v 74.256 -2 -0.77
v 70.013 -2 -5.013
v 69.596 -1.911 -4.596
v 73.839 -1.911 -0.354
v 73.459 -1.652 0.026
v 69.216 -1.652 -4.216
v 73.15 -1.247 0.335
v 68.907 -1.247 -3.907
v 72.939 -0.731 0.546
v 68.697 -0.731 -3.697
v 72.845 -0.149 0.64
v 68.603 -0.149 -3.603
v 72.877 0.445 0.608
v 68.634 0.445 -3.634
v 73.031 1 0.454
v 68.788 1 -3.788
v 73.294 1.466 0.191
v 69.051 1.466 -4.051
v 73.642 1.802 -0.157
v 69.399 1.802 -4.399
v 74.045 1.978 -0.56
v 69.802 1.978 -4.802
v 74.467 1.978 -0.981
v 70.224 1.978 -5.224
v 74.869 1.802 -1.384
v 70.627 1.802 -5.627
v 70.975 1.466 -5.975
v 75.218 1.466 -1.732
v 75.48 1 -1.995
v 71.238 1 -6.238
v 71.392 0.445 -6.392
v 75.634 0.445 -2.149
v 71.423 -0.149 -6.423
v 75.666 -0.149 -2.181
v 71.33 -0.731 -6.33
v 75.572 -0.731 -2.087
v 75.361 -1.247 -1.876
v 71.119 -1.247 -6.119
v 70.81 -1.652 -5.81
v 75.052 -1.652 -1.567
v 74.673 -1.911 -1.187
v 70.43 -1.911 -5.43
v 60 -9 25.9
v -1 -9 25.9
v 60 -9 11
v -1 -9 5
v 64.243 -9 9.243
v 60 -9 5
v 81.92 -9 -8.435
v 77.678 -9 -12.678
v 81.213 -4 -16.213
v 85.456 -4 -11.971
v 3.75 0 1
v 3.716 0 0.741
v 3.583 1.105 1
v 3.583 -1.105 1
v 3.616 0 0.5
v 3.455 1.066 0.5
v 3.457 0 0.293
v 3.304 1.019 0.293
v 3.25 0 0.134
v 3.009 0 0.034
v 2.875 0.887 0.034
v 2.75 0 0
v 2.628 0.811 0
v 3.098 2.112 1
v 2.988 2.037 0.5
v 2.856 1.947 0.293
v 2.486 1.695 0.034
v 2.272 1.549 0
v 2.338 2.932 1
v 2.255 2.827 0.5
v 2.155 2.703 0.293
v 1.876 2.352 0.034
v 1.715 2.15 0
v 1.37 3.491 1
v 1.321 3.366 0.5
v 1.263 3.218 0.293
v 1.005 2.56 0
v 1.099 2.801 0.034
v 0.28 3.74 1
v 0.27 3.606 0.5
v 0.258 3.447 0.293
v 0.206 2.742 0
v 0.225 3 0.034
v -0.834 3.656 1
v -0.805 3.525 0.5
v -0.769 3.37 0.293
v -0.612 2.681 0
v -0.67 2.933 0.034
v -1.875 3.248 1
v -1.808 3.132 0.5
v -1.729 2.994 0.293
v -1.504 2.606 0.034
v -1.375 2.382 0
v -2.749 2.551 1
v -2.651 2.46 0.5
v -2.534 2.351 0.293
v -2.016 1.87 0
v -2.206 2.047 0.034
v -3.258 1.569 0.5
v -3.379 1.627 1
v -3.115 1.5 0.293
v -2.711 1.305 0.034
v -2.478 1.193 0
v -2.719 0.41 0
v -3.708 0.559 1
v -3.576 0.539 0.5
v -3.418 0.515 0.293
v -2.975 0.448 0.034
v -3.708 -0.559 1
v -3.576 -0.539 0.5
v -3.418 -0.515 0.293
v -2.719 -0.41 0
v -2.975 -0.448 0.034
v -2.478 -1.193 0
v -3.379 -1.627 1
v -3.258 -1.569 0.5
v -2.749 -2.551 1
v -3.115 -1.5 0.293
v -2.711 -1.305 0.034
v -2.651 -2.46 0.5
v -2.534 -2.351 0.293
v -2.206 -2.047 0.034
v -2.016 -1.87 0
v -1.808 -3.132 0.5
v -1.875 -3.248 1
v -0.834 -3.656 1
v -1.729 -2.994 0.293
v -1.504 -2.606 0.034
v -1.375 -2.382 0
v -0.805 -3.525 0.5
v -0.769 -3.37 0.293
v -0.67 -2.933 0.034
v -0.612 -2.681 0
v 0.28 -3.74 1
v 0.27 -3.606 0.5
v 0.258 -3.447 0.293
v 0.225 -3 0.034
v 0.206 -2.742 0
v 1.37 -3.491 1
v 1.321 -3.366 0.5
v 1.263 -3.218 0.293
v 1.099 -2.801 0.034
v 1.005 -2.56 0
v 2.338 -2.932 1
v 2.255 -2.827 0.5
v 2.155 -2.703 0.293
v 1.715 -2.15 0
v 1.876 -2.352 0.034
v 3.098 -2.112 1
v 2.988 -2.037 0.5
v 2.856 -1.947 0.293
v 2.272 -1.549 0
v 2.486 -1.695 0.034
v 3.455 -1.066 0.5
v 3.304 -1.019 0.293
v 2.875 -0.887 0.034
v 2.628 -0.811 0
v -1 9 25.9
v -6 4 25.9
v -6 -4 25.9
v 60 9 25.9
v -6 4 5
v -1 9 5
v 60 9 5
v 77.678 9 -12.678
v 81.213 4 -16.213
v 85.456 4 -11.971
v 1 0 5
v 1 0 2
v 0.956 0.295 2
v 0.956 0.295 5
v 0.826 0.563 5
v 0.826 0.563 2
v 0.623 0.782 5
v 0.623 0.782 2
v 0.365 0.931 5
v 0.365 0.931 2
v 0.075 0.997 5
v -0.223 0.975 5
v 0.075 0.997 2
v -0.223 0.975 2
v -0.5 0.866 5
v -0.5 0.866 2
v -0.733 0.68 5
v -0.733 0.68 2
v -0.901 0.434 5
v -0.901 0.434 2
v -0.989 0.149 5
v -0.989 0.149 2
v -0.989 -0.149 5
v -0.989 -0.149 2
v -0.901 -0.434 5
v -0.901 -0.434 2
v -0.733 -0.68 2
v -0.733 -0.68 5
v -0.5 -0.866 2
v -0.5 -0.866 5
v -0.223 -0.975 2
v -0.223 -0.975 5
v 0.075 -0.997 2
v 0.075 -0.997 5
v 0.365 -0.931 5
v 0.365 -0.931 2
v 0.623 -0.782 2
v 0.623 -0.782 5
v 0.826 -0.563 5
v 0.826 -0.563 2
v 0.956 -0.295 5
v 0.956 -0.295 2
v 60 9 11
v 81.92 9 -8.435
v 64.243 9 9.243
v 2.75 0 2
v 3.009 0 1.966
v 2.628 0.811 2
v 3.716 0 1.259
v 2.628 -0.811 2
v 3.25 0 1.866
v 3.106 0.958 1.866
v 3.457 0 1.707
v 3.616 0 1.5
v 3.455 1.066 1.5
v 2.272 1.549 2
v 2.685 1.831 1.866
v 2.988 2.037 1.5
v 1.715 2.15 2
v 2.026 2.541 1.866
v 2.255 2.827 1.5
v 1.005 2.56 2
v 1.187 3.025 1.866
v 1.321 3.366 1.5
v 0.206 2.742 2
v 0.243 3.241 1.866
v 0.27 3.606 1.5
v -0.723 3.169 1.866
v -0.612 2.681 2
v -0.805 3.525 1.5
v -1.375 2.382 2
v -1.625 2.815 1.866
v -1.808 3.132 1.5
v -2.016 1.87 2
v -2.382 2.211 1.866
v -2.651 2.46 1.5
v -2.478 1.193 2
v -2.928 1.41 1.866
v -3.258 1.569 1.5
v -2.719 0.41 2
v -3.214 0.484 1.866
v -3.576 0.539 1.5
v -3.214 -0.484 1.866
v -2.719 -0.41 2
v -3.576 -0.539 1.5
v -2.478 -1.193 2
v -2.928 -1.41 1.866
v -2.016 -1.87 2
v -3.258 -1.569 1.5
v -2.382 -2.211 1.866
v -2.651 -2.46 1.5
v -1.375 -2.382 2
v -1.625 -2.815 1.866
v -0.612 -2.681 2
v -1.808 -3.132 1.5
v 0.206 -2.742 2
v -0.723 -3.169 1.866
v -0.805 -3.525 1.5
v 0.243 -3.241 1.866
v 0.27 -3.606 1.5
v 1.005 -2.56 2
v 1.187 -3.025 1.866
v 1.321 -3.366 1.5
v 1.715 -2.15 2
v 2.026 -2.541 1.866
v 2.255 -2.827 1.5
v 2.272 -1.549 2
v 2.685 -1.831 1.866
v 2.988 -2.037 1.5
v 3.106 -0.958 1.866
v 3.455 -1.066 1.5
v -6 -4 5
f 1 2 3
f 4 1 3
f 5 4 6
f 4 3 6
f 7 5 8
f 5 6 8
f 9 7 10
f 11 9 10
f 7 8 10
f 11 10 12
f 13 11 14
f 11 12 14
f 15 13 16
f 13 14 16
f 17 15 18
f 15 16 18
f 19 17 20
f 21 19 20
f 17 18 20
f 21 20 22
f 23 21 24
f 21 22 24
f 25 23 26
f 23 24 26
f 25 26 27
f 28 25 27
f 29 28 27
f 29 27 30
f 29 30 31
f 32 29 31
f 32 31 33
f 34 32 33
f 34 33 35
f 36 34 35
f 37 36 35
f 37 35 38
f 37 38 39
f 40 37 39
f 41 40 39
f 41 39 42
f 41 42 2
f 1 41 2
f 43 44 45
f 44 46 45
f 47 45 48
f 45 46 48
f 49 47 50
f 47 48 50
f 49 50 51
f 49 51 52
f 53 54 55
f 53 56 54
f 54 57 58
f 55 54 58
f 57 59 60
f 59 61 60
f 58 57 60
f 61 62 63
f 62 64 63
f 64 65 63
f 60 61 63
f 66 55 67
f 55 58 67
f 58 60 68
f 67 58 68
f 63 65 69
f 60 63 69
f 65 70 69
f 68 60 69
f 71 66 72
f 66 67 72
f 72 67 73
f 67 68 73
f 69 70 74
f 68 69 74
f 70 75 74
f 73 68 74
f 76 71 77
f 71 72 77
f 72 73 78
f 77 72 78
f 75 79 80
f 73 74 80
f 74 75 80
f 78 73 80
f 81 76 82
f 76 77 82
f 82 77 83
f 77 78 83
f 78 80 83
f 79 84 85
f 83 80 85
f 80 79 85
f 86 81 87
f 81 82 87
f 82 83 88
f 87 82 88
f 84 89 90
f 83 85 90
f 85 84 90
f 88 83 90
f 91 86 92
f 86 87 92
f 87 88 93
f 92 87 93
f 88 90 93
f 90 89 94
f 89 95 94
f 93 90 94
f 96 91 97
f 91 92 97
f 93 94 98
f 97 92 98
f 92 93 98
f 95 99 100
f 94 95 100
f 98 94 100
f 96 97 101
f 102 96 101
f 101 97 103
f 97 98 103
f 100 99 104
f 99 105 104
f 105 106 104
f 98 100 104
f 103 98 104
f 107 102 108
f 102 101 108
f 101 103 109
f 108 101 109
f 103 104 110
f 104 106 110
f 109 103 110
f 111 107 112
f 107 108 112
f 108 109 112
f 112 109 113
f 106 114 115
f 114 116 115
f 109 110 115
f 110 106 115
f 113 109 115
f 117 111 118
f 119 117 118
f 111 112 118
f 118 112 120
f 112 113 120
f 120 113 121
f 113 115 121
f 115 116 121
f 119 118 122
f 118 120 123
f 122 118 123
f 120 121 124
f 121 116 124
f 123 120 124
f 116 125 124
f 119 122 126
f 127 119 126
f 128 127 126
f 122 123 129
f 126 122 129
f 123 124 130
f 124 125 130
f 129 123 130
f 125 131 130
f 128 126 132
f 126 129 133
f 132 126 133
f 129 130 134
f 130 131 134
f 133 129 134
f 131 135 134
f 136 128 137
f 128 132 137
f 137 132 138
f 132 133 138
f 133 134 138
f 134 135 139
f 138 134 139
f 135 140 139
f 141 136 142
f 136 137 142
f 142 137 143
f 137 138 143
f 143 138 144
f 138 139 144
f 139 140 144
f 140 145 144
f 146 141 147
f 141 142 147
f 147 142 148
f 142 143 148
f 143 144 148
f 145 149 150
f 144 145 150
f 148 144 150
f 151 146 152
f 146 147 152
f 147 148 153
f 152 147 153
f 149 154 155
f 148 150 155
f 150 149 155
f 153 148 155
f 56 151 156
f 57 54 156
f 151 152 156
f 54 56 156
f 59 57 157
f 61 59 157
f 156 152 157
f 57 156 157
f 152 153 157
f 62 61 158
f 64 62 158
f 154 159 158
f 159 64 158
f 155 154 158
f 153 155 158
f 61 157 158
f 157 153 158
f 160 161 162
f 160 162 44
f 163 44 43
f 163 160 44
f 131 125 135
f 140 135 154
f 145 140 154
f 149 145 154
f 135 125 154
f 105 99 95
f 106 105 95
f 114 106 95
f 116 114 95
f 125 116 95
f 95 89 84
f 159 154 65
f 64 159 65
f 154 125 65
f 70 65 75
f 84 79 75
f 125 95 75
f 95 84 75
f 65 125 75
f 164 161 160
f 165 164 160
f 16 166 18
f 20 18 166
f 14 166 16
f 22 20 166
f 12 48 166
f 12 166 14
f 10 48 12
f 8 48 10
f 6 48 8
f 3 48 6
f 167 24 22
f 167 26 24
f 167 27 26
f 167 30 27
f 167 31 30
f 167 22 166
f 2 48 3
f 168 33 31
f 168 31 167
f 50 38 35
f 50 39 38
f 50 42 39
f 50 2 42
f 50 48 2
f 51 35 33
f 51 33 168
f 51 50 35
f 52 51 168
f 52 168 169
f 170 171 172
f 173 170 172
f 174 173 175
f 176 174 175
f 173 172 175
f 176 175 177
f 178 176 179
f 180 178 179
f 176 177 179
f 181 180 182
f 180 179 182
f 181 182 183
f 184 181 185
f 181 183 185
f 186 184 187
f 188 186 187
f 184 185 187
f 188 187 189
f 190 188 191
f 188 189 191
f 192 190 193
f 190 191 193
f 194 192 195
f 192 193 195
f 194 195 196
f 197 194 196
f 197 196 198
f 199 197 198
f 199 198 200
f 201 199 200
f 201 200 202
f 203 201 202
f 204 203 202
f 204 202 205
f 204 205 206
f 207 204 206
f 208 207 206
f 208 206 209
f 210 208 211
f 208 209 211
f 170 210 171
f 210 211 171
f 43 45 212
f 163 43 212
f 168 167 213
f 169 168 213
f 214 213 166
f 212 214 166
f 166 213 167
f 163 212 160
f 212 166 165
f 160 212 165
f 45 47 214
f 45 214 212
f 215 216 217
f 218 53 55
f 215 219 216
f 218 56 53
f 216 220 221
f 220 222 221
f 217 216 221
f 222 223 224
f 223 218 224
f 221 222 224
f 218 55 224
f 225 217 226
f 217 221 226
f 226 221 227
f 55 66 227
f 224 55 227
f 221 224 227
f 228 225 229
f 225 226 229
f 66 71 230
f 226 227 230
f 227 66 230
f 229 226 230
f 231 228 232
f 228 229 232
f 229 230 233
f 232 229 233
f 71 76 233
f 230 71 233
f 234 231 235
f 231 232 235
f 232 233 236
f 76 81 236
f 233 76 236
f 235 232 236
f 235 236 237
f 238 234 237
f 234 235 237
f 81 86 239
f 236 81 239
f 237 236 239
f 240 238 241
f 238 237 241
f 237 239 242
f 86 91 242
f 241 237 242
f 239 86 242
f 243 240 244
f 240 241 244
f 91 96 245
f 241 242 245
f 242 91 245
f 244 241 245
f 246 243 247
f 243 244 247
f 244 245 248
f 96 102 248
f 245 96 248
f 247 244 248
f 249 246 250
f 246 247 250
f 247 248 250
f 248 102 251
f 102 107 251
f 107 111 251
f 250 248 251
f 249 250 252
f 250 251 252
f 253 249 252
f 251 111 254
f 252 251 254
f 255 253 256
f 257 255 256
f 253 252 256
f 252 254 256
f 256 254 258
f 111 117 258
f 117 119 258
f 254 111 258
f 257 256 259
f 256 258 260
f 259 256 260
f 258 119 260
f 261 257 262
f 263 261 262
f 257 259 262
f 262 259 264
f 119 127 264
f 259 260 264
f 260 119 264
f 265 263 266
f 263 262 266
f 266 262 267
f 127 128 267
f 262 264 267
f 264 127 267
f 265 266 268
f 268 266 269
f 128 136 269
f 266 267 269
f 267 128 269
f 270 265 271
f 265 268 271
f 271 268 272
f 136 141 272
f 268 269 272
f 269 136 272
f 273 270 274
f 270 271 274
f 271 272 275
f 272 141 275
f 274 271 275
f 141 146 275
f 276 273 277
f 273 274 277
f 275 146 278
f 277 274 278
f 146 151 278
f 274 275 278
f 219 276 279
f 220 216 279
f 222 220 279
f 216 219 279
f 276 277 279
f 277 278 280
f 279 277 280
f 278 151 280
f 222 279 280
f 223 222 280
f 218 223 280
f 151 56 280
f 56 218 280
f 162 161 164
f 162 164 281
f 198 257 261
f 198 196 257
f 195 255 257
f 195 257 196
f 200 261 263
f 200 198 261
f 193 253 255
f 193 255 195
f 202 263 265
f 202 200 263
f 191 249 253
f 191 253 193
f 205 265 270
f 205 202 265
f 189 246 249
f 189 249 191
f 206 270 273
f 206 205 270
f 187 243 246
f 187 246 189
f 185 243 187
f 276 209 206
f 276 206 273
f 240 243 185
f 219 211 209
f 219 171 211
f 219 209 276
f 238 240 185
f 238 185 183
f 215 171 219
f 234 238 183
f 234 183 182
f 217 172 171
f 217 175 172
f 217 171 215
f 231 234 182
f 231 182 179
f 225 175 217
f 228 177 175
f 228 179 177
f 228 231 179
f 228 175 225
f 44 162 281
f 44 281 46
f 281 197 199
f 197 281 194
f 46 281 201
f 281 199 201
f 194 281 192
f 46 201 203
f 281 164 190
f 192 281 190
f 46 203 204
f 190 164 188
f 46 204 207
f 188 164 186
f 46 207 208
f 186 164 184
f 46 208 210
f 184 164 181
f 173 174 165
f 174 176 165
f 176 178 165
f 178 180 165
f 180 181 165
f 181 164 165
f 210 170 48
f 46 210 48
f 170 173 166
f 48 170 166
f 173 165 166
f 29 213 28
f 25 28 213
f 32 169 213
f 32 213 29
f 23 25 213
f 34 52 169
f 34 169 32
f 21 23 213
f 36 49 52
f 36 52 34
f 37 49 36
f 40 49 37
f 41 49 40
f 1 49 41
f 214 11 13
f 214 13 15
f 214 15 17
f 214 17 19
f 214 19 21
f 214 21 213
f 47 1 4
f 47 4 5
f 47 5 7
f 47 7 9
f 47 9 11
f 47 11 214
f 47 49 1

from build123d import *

# Parameters (mm, degrees)
F0_R      = 3.75
F1_DEPTH  = 2
F2_R      = 1
F3_DEPTH  = 3
F4_W      = 37.5
F4_H      = 18
F5_DEPTH  = 6
F7_DEPTH  = 18
F8_R      = 2
F9_DEPTH  = 37.8
F10_R     = 0.99999
F11_SIZE  = 5
F12_DEPTH = 14.9


# Not quite as in the source:
# - a fillet or chamfer is up to 0.001 mm smaller than in the source, because OpenCascade refuses the exact size


with BuildPart() as f1:
    # F0 (on Top) → F1 (new body)
    with BuildSketch(Plane.XY):
        Circle(F0_R)
    extrude(amount=F1_DEPTH)

    # F2 (on face) → F3 (join)
    with BuildSketch(Plane.XY.offset(2)):
        Circle(F2_R)
    extrude(amount=F3_DEPTH)

    # F4 (on face) → F5 (join)
    with BuildSketch(Plane.XY.offset(5)):
        with BuildLine():
            Line((22.5, 9), (0, 9))
            Line((0, 9), (0, 1))
            ThreePointArc((0, 1), (0.7071067812, 0.7071067812), (1, 0))
            ThreePointArc((1, 0), (0.7071067812, -0.7071067812), (0, -1))
            Line((0, -1), (0, -9))
            Line((0, -9), (22.5, -9))
            Line((22.5, -9), (22.5, 9))
        make_face()
        with BuildLine():
            ThreePointArc((1, 0), (0.7071067812, 0.7071067812), (0, 1))
            Line((0, 1), (0, -1))
            ThreePointArc((0, -1), (0.7071067812, -0.7071067812), (1, 0))
        make_face()
        with BuildLine():
            Line((0, -1), (0, 1))
            ThreePointArc((0, 1), (-1, 0), (0, -1))
        make_face()
        with BuildLine():
            Line((0, 9), (-6, 9))
            Line((-6, 9), (-6, -9))
            Line((-6, -9), (0, -9))
            Line((0, -9), (0, -1))
            ThreePointArc((0, -1), (-1, 0), (0, 1))
            Line((0, 1), (0, 9))
        make_face()
        with Locations((41.25, 0)):
            Rectangle(F4_W, F4_H)
    extrude(amount=F5_DEPTH)

    # F6 (on face) → F7 (join)
    with BuildSketch(Plane.XZ.offset(9)):
        Polygon((64.2426406871, 9.2426406871), (60, 5), (81.2132034356, -16.2132034356), (85.4558441227, -11.9705627485), align=None)
        Polygon((60, 11), (60, 5), (64.2426406871, 9.2426406871), align=None)
    extrude(amount=-F7_DEPTH)

    # F8 (on face) → F9 (cut)
    with BuildSketch(Plane(origin=(32.5, 0, 32.5), x_dir=(0, -1, 0), z_dir=(-0.7071067812, 0, -0.7071067812))):
        with Locations((0, -53.0515164137)):
            Circle(F8_R)
    extrude(amount=-F9_DEPTH, mode=Mode.SUBTRACT)

    # F10 (radius 1 in the source; OpenCascade refuses exactly that, so slightly less here)
    f10_edges = [f1.edges().sort_by_distance(p)[0] for p in [
        (-3.75, 0, 0),
        (-3.75, 0, 2),
    ]]
    fillet(f10_edges, radius=F10_R)

    # F11
    f11_edges = [f1.edges().sort_by_distance(p)[0] for p in [
        (-6, -9, 8),
        (-6, 9, 8),
        (83.334524, 9, -14.091883),
        (83.334524, -9, -14.091883),
    ]]
    chamfer(f11_edges, length=F11_SIZE)

    # F12 (add): a face of the model
    f12_faces = [f1.faces().sort_by_distance(p)[0] for p in [
        (27.6735454285, 0, 11),
    ]]
    extrude(f12_faces, amount=F12_DEPTH)


solid = f1.part
